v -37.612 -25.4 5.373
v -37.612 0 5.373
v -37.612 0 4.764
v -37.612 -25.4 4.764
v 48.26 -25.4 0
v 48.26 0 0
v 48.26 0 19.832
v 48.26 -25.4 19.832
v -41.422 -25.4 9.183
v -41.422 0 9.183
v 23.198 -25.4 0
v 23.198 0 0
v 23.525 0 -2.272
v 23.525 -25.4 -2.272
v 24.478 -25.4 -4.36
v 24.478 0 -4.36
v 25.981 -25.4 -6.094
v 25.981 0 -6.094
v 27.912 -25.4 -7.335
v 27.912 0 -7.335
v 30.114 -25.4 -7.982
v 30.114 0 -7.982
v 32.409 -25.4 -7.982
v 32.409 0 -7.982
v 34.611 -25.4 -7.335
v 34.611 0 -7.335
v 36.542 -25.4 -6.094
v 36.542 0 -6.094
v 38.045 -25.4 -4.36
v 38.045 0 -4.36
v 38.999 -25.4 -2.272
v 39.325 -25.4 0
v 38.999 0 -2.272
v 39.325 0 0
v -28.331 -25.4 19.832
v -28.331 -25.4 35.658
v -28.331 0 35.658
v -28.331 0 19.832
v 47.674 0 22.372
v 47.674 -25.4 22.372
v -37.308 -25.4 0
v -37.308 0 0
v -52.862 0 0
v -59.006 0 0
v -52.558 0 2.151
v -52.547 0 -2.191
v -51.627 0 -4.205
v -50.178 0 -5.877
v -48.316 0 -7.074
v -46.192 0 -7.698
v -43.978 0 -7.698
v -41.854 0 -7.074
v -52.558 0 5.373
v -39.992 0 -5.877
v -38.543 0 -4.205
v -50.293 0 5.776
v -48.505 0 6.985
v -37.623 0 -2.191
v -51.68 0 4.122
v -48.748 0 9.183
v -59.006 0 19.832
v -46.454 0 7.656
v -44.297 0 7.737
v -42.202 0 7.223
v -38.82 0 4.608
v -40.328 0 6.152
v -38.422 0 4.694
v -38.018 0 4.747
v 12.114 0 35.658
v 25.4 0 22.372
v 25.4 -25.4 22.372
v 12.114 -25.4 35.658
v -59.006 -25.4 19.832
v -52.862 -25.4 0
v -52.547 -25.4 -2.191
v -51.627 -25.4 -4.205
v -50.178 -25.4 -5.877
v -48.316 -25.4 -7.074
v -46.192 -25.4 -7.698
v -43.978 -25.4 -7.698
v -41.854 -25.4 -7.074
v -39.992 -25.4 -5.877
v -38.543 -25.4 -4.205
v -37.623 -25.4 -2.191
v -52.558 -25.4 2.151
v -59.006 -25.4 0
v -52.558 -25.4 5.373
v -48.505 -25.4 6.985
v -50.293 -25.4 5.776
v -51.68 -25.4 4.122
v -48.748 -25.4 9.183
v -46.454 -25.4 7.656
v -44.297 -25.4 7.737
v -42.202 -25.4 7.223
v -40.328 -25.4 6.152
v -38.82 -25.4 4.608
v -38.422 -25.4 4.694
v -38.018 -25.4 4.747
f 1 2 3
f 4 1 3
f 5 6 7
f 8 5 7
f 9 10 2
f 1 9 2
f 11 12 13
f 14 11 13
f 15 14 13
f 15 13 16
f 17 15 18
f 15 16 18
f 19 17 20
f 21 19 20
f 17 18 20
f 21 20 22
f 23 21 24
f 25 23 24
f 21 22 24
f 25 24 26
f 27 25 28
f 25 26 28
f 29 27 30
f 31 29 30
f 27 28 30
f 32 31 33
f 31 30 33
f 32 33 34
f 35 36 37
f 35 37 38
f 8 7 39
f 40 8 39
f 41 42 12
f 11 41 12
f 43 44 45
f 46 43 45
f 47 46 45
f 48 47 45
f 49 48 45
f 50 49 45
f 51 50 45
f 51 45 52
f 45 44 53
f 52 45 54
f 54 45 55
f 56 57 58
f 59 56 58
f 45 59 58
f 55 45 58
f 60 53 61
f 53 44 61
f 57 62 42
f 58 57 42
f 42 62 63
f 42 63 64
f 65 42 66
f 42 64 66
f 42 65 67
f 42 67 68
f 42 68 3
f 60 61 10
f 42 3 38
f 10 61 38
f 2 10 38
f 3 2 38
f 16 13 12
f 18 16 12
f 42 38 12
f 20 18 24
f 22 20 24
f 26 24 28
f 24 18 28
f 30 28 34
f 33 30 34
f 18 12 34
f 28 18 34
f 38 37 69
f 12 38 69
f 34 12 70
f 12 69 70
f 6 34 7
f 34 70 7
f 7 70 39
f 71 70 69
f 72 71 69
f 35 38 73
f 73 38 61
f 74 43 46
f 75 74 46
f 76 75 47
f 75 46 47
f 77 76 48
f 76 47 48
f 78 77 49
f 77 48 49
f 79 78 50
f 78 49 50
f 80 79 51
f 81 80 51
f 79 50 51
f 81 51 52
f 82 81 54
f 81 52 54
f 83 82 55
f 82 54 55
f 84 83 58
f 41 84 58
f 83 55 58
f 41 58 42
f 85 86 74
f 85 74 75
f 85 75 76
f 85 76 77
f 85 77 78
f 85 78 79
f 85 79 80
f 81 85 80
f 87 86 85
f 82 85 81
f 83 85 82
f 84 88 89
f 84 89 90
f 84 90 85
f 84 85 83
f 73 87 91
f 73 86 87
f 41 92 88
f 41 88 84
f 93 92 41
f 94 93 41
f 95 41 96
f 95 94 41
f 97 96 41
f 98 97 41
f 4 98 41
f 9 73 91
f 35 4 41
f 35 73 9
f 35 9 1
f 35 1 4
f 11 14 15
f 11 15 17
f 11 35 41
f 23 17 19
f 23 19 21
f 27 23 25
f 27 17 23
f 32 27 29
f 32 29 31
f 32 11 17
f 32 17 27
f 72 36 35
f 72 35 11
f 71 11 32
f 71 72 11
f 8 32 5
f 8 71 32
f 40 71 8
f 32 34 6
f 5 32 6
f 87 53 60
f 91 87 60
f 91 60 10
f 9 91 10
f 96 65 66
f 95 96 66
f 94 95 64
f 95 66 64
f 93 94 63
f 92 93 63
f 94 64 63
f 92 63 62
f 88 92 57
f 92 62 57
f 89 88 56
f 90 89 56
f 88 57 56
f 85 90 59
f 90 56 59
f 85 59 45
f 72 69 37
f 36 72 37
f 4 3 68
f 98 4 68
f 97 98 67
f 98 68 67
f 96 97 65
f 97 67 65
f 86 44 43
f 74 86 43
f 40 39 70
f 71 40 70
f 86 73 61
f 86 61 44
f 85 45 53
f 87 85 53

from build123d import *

# Parameters (mm, degrees)
F1_DEPTH = 25.4


with BuildPart() as f1:
    # F0 (on Front) → F1 (new body)
    with BuildSketch(Plane.XZ):
        with BuildLine():
            Line((-59.0061545372, 19.8315382004), (-59.0061545372, 0))
            Line((-59.0061545372, 0), (-57.6384626329, 0))
            Line((-57.6384626329, 0), (-52.8619785953, 0))
            ThreePointArc((-52.8619785953, 0), (-52.785725887, 1.0863777847), (-52.5584630668, 2.1514518559))
            Line((-52.5584630668, 2.1514518559), (-52.5584630668, 5.3730774671))
            Line((-52.5584630668, 5.3730774671), (-48.7484624609, 9.183078073))
            Line((-48.7484624609, 9.183078073), (-41.4215400815, 9.183078073))
            Line((-41.4215400815, 9.183078073), (-37.6115394756, 5.3730774671))
            Line((-37.6115394756, 5.3730774671), (-37.6115394756, 4.7639395972))
            ThreePointArc((-37.6115394756, 4.7639395972), (-38.2208958426, 4.7248074356), (-38.8202414059, 4.6080538331))
            ThreePointArc((-38.8202414059, 4.6080538331), (-37.6957431315, 2.4249207086), (-37.3080239472, 0))
            Line((-37.3080239472, 0), (23.1979270853, 0))
            ThreePointArc((23.1979270853, 0), (23.2602248919, 1.000404867), (23.446155712, 1.9853518934))
            ThreePointArc((23.446155712, 1.9853518934), (30.0178470159, 7.9671258273), (38.0999986082, 4.2728638401))
            ThreePointArc((38.0999986082, 4.2728638401), (39.0128166681, 2.2225195794), (39.3251548134, 0))
            Line((39.3251548134, 0), (48.2600033283, 0))
            Line((48.2600033283, 0), (48.2600033283, 16.9007703662))
            Line((48.2600033283, 16.9007703662), (48.2600033283, 19.8315382004))
            Line((48.2600033283, 19.8315382004), (47.6738475263, 22.3715398461))
            Line((47.6738475263, 22.3715398461), (25.399999693, 22.3715398461))
            Line((25.399999693, 22.3715398461), (12.1138468385, 35.6576927006))
            Line((12.1138468385, 35.6576927006), (-28.3307693899, 35.6576927006))
            Line((-28.3307693899, 35.6576927006), (-28.3307693899, 19.8315382004))
            Line((-28.3307693899, 19.8315382004), (-59.0061545372, 19.8315382004))
        make_face()
        with BuildLine():
            ThreePointArc((-52.5584630668, 2.1514518559), (-52.785725887, 1.0863777847), (-52.8619785953, 0))
            Line((-52.8619785953, 0), (-52.5584630668, 0))
            Line((-52.5584630668, 0), (-52.5584630668, 2.1514518559))
        make_face()
        with BuildLine():
            Line((-52.5584630668, 0), (-52.8619785953, 0))
            ThreePointArc((-52.8619785953, 0), (-45.0850012712, -7.776977324), (-37.3080239472, 0))
            ThreePointArc((-37.3080239472, 0), (-37.6957431315, 2.4249207086), (-38.8202414059, 4.6080538331))
            ThreePointArc((-38.8202414059, 4.6080538331), (-46.4539291026, 7.6555478505), (-52.5584630668, 2.1514518559))
            Line((-52.5584630668, 2.1514518559), (-52.5584630668, 0))
        make_face()
        with BuildLine():
            Line((23.446155712, 0), (23.1979270853, 0))
            ThreePointArc((23.1979270853, 0), (31.2615409493, -8.0636138641), (39.3251548134, 0))
            Line((39.3251548134, 0), (38.0999986082, 0))
            Line((38.0999986082, 0), (23.446155712, 0))
        make_face()
        with BuildLine():
            ThreePointArc((23.446155712, 1.9853518934), (23.2602248919, 1.000404867), (23.1979270853, 0))
            Line((23.1979270853, 0), (23.446155712, 0))
            Line((23.446155712, 0), (23.446155712, 1.9853518934))
        make_face()
        with BuildLine():
            Line((38.0999986082, 0), (39.3251548134, 0))
            ThreePointArc((39.3251548134, 0), (39.0128166681, 2.2225195794), (38.0999986082, 4.2728638401))
            Line((38.0999986082, 4.2728638401), (38.0999986082, 0))
        make_face()
        with BuildLine():
            ThreePointArc((38.0999986082, 4.2728638401), (30.0178470159, 7.9671258273), (23.446155712, 1.9853518934))
            Line((23.446155712, 1.9853518934), (23.446155712, 0))
            Line((23.446155712, 0), (38.0999986082, 0))
            Line((38.0999986082, 0), (38.0999986082, 4.2728638401))
        make_face()
    extrude(amount=F1_DEPTH)


solid = f1.part
